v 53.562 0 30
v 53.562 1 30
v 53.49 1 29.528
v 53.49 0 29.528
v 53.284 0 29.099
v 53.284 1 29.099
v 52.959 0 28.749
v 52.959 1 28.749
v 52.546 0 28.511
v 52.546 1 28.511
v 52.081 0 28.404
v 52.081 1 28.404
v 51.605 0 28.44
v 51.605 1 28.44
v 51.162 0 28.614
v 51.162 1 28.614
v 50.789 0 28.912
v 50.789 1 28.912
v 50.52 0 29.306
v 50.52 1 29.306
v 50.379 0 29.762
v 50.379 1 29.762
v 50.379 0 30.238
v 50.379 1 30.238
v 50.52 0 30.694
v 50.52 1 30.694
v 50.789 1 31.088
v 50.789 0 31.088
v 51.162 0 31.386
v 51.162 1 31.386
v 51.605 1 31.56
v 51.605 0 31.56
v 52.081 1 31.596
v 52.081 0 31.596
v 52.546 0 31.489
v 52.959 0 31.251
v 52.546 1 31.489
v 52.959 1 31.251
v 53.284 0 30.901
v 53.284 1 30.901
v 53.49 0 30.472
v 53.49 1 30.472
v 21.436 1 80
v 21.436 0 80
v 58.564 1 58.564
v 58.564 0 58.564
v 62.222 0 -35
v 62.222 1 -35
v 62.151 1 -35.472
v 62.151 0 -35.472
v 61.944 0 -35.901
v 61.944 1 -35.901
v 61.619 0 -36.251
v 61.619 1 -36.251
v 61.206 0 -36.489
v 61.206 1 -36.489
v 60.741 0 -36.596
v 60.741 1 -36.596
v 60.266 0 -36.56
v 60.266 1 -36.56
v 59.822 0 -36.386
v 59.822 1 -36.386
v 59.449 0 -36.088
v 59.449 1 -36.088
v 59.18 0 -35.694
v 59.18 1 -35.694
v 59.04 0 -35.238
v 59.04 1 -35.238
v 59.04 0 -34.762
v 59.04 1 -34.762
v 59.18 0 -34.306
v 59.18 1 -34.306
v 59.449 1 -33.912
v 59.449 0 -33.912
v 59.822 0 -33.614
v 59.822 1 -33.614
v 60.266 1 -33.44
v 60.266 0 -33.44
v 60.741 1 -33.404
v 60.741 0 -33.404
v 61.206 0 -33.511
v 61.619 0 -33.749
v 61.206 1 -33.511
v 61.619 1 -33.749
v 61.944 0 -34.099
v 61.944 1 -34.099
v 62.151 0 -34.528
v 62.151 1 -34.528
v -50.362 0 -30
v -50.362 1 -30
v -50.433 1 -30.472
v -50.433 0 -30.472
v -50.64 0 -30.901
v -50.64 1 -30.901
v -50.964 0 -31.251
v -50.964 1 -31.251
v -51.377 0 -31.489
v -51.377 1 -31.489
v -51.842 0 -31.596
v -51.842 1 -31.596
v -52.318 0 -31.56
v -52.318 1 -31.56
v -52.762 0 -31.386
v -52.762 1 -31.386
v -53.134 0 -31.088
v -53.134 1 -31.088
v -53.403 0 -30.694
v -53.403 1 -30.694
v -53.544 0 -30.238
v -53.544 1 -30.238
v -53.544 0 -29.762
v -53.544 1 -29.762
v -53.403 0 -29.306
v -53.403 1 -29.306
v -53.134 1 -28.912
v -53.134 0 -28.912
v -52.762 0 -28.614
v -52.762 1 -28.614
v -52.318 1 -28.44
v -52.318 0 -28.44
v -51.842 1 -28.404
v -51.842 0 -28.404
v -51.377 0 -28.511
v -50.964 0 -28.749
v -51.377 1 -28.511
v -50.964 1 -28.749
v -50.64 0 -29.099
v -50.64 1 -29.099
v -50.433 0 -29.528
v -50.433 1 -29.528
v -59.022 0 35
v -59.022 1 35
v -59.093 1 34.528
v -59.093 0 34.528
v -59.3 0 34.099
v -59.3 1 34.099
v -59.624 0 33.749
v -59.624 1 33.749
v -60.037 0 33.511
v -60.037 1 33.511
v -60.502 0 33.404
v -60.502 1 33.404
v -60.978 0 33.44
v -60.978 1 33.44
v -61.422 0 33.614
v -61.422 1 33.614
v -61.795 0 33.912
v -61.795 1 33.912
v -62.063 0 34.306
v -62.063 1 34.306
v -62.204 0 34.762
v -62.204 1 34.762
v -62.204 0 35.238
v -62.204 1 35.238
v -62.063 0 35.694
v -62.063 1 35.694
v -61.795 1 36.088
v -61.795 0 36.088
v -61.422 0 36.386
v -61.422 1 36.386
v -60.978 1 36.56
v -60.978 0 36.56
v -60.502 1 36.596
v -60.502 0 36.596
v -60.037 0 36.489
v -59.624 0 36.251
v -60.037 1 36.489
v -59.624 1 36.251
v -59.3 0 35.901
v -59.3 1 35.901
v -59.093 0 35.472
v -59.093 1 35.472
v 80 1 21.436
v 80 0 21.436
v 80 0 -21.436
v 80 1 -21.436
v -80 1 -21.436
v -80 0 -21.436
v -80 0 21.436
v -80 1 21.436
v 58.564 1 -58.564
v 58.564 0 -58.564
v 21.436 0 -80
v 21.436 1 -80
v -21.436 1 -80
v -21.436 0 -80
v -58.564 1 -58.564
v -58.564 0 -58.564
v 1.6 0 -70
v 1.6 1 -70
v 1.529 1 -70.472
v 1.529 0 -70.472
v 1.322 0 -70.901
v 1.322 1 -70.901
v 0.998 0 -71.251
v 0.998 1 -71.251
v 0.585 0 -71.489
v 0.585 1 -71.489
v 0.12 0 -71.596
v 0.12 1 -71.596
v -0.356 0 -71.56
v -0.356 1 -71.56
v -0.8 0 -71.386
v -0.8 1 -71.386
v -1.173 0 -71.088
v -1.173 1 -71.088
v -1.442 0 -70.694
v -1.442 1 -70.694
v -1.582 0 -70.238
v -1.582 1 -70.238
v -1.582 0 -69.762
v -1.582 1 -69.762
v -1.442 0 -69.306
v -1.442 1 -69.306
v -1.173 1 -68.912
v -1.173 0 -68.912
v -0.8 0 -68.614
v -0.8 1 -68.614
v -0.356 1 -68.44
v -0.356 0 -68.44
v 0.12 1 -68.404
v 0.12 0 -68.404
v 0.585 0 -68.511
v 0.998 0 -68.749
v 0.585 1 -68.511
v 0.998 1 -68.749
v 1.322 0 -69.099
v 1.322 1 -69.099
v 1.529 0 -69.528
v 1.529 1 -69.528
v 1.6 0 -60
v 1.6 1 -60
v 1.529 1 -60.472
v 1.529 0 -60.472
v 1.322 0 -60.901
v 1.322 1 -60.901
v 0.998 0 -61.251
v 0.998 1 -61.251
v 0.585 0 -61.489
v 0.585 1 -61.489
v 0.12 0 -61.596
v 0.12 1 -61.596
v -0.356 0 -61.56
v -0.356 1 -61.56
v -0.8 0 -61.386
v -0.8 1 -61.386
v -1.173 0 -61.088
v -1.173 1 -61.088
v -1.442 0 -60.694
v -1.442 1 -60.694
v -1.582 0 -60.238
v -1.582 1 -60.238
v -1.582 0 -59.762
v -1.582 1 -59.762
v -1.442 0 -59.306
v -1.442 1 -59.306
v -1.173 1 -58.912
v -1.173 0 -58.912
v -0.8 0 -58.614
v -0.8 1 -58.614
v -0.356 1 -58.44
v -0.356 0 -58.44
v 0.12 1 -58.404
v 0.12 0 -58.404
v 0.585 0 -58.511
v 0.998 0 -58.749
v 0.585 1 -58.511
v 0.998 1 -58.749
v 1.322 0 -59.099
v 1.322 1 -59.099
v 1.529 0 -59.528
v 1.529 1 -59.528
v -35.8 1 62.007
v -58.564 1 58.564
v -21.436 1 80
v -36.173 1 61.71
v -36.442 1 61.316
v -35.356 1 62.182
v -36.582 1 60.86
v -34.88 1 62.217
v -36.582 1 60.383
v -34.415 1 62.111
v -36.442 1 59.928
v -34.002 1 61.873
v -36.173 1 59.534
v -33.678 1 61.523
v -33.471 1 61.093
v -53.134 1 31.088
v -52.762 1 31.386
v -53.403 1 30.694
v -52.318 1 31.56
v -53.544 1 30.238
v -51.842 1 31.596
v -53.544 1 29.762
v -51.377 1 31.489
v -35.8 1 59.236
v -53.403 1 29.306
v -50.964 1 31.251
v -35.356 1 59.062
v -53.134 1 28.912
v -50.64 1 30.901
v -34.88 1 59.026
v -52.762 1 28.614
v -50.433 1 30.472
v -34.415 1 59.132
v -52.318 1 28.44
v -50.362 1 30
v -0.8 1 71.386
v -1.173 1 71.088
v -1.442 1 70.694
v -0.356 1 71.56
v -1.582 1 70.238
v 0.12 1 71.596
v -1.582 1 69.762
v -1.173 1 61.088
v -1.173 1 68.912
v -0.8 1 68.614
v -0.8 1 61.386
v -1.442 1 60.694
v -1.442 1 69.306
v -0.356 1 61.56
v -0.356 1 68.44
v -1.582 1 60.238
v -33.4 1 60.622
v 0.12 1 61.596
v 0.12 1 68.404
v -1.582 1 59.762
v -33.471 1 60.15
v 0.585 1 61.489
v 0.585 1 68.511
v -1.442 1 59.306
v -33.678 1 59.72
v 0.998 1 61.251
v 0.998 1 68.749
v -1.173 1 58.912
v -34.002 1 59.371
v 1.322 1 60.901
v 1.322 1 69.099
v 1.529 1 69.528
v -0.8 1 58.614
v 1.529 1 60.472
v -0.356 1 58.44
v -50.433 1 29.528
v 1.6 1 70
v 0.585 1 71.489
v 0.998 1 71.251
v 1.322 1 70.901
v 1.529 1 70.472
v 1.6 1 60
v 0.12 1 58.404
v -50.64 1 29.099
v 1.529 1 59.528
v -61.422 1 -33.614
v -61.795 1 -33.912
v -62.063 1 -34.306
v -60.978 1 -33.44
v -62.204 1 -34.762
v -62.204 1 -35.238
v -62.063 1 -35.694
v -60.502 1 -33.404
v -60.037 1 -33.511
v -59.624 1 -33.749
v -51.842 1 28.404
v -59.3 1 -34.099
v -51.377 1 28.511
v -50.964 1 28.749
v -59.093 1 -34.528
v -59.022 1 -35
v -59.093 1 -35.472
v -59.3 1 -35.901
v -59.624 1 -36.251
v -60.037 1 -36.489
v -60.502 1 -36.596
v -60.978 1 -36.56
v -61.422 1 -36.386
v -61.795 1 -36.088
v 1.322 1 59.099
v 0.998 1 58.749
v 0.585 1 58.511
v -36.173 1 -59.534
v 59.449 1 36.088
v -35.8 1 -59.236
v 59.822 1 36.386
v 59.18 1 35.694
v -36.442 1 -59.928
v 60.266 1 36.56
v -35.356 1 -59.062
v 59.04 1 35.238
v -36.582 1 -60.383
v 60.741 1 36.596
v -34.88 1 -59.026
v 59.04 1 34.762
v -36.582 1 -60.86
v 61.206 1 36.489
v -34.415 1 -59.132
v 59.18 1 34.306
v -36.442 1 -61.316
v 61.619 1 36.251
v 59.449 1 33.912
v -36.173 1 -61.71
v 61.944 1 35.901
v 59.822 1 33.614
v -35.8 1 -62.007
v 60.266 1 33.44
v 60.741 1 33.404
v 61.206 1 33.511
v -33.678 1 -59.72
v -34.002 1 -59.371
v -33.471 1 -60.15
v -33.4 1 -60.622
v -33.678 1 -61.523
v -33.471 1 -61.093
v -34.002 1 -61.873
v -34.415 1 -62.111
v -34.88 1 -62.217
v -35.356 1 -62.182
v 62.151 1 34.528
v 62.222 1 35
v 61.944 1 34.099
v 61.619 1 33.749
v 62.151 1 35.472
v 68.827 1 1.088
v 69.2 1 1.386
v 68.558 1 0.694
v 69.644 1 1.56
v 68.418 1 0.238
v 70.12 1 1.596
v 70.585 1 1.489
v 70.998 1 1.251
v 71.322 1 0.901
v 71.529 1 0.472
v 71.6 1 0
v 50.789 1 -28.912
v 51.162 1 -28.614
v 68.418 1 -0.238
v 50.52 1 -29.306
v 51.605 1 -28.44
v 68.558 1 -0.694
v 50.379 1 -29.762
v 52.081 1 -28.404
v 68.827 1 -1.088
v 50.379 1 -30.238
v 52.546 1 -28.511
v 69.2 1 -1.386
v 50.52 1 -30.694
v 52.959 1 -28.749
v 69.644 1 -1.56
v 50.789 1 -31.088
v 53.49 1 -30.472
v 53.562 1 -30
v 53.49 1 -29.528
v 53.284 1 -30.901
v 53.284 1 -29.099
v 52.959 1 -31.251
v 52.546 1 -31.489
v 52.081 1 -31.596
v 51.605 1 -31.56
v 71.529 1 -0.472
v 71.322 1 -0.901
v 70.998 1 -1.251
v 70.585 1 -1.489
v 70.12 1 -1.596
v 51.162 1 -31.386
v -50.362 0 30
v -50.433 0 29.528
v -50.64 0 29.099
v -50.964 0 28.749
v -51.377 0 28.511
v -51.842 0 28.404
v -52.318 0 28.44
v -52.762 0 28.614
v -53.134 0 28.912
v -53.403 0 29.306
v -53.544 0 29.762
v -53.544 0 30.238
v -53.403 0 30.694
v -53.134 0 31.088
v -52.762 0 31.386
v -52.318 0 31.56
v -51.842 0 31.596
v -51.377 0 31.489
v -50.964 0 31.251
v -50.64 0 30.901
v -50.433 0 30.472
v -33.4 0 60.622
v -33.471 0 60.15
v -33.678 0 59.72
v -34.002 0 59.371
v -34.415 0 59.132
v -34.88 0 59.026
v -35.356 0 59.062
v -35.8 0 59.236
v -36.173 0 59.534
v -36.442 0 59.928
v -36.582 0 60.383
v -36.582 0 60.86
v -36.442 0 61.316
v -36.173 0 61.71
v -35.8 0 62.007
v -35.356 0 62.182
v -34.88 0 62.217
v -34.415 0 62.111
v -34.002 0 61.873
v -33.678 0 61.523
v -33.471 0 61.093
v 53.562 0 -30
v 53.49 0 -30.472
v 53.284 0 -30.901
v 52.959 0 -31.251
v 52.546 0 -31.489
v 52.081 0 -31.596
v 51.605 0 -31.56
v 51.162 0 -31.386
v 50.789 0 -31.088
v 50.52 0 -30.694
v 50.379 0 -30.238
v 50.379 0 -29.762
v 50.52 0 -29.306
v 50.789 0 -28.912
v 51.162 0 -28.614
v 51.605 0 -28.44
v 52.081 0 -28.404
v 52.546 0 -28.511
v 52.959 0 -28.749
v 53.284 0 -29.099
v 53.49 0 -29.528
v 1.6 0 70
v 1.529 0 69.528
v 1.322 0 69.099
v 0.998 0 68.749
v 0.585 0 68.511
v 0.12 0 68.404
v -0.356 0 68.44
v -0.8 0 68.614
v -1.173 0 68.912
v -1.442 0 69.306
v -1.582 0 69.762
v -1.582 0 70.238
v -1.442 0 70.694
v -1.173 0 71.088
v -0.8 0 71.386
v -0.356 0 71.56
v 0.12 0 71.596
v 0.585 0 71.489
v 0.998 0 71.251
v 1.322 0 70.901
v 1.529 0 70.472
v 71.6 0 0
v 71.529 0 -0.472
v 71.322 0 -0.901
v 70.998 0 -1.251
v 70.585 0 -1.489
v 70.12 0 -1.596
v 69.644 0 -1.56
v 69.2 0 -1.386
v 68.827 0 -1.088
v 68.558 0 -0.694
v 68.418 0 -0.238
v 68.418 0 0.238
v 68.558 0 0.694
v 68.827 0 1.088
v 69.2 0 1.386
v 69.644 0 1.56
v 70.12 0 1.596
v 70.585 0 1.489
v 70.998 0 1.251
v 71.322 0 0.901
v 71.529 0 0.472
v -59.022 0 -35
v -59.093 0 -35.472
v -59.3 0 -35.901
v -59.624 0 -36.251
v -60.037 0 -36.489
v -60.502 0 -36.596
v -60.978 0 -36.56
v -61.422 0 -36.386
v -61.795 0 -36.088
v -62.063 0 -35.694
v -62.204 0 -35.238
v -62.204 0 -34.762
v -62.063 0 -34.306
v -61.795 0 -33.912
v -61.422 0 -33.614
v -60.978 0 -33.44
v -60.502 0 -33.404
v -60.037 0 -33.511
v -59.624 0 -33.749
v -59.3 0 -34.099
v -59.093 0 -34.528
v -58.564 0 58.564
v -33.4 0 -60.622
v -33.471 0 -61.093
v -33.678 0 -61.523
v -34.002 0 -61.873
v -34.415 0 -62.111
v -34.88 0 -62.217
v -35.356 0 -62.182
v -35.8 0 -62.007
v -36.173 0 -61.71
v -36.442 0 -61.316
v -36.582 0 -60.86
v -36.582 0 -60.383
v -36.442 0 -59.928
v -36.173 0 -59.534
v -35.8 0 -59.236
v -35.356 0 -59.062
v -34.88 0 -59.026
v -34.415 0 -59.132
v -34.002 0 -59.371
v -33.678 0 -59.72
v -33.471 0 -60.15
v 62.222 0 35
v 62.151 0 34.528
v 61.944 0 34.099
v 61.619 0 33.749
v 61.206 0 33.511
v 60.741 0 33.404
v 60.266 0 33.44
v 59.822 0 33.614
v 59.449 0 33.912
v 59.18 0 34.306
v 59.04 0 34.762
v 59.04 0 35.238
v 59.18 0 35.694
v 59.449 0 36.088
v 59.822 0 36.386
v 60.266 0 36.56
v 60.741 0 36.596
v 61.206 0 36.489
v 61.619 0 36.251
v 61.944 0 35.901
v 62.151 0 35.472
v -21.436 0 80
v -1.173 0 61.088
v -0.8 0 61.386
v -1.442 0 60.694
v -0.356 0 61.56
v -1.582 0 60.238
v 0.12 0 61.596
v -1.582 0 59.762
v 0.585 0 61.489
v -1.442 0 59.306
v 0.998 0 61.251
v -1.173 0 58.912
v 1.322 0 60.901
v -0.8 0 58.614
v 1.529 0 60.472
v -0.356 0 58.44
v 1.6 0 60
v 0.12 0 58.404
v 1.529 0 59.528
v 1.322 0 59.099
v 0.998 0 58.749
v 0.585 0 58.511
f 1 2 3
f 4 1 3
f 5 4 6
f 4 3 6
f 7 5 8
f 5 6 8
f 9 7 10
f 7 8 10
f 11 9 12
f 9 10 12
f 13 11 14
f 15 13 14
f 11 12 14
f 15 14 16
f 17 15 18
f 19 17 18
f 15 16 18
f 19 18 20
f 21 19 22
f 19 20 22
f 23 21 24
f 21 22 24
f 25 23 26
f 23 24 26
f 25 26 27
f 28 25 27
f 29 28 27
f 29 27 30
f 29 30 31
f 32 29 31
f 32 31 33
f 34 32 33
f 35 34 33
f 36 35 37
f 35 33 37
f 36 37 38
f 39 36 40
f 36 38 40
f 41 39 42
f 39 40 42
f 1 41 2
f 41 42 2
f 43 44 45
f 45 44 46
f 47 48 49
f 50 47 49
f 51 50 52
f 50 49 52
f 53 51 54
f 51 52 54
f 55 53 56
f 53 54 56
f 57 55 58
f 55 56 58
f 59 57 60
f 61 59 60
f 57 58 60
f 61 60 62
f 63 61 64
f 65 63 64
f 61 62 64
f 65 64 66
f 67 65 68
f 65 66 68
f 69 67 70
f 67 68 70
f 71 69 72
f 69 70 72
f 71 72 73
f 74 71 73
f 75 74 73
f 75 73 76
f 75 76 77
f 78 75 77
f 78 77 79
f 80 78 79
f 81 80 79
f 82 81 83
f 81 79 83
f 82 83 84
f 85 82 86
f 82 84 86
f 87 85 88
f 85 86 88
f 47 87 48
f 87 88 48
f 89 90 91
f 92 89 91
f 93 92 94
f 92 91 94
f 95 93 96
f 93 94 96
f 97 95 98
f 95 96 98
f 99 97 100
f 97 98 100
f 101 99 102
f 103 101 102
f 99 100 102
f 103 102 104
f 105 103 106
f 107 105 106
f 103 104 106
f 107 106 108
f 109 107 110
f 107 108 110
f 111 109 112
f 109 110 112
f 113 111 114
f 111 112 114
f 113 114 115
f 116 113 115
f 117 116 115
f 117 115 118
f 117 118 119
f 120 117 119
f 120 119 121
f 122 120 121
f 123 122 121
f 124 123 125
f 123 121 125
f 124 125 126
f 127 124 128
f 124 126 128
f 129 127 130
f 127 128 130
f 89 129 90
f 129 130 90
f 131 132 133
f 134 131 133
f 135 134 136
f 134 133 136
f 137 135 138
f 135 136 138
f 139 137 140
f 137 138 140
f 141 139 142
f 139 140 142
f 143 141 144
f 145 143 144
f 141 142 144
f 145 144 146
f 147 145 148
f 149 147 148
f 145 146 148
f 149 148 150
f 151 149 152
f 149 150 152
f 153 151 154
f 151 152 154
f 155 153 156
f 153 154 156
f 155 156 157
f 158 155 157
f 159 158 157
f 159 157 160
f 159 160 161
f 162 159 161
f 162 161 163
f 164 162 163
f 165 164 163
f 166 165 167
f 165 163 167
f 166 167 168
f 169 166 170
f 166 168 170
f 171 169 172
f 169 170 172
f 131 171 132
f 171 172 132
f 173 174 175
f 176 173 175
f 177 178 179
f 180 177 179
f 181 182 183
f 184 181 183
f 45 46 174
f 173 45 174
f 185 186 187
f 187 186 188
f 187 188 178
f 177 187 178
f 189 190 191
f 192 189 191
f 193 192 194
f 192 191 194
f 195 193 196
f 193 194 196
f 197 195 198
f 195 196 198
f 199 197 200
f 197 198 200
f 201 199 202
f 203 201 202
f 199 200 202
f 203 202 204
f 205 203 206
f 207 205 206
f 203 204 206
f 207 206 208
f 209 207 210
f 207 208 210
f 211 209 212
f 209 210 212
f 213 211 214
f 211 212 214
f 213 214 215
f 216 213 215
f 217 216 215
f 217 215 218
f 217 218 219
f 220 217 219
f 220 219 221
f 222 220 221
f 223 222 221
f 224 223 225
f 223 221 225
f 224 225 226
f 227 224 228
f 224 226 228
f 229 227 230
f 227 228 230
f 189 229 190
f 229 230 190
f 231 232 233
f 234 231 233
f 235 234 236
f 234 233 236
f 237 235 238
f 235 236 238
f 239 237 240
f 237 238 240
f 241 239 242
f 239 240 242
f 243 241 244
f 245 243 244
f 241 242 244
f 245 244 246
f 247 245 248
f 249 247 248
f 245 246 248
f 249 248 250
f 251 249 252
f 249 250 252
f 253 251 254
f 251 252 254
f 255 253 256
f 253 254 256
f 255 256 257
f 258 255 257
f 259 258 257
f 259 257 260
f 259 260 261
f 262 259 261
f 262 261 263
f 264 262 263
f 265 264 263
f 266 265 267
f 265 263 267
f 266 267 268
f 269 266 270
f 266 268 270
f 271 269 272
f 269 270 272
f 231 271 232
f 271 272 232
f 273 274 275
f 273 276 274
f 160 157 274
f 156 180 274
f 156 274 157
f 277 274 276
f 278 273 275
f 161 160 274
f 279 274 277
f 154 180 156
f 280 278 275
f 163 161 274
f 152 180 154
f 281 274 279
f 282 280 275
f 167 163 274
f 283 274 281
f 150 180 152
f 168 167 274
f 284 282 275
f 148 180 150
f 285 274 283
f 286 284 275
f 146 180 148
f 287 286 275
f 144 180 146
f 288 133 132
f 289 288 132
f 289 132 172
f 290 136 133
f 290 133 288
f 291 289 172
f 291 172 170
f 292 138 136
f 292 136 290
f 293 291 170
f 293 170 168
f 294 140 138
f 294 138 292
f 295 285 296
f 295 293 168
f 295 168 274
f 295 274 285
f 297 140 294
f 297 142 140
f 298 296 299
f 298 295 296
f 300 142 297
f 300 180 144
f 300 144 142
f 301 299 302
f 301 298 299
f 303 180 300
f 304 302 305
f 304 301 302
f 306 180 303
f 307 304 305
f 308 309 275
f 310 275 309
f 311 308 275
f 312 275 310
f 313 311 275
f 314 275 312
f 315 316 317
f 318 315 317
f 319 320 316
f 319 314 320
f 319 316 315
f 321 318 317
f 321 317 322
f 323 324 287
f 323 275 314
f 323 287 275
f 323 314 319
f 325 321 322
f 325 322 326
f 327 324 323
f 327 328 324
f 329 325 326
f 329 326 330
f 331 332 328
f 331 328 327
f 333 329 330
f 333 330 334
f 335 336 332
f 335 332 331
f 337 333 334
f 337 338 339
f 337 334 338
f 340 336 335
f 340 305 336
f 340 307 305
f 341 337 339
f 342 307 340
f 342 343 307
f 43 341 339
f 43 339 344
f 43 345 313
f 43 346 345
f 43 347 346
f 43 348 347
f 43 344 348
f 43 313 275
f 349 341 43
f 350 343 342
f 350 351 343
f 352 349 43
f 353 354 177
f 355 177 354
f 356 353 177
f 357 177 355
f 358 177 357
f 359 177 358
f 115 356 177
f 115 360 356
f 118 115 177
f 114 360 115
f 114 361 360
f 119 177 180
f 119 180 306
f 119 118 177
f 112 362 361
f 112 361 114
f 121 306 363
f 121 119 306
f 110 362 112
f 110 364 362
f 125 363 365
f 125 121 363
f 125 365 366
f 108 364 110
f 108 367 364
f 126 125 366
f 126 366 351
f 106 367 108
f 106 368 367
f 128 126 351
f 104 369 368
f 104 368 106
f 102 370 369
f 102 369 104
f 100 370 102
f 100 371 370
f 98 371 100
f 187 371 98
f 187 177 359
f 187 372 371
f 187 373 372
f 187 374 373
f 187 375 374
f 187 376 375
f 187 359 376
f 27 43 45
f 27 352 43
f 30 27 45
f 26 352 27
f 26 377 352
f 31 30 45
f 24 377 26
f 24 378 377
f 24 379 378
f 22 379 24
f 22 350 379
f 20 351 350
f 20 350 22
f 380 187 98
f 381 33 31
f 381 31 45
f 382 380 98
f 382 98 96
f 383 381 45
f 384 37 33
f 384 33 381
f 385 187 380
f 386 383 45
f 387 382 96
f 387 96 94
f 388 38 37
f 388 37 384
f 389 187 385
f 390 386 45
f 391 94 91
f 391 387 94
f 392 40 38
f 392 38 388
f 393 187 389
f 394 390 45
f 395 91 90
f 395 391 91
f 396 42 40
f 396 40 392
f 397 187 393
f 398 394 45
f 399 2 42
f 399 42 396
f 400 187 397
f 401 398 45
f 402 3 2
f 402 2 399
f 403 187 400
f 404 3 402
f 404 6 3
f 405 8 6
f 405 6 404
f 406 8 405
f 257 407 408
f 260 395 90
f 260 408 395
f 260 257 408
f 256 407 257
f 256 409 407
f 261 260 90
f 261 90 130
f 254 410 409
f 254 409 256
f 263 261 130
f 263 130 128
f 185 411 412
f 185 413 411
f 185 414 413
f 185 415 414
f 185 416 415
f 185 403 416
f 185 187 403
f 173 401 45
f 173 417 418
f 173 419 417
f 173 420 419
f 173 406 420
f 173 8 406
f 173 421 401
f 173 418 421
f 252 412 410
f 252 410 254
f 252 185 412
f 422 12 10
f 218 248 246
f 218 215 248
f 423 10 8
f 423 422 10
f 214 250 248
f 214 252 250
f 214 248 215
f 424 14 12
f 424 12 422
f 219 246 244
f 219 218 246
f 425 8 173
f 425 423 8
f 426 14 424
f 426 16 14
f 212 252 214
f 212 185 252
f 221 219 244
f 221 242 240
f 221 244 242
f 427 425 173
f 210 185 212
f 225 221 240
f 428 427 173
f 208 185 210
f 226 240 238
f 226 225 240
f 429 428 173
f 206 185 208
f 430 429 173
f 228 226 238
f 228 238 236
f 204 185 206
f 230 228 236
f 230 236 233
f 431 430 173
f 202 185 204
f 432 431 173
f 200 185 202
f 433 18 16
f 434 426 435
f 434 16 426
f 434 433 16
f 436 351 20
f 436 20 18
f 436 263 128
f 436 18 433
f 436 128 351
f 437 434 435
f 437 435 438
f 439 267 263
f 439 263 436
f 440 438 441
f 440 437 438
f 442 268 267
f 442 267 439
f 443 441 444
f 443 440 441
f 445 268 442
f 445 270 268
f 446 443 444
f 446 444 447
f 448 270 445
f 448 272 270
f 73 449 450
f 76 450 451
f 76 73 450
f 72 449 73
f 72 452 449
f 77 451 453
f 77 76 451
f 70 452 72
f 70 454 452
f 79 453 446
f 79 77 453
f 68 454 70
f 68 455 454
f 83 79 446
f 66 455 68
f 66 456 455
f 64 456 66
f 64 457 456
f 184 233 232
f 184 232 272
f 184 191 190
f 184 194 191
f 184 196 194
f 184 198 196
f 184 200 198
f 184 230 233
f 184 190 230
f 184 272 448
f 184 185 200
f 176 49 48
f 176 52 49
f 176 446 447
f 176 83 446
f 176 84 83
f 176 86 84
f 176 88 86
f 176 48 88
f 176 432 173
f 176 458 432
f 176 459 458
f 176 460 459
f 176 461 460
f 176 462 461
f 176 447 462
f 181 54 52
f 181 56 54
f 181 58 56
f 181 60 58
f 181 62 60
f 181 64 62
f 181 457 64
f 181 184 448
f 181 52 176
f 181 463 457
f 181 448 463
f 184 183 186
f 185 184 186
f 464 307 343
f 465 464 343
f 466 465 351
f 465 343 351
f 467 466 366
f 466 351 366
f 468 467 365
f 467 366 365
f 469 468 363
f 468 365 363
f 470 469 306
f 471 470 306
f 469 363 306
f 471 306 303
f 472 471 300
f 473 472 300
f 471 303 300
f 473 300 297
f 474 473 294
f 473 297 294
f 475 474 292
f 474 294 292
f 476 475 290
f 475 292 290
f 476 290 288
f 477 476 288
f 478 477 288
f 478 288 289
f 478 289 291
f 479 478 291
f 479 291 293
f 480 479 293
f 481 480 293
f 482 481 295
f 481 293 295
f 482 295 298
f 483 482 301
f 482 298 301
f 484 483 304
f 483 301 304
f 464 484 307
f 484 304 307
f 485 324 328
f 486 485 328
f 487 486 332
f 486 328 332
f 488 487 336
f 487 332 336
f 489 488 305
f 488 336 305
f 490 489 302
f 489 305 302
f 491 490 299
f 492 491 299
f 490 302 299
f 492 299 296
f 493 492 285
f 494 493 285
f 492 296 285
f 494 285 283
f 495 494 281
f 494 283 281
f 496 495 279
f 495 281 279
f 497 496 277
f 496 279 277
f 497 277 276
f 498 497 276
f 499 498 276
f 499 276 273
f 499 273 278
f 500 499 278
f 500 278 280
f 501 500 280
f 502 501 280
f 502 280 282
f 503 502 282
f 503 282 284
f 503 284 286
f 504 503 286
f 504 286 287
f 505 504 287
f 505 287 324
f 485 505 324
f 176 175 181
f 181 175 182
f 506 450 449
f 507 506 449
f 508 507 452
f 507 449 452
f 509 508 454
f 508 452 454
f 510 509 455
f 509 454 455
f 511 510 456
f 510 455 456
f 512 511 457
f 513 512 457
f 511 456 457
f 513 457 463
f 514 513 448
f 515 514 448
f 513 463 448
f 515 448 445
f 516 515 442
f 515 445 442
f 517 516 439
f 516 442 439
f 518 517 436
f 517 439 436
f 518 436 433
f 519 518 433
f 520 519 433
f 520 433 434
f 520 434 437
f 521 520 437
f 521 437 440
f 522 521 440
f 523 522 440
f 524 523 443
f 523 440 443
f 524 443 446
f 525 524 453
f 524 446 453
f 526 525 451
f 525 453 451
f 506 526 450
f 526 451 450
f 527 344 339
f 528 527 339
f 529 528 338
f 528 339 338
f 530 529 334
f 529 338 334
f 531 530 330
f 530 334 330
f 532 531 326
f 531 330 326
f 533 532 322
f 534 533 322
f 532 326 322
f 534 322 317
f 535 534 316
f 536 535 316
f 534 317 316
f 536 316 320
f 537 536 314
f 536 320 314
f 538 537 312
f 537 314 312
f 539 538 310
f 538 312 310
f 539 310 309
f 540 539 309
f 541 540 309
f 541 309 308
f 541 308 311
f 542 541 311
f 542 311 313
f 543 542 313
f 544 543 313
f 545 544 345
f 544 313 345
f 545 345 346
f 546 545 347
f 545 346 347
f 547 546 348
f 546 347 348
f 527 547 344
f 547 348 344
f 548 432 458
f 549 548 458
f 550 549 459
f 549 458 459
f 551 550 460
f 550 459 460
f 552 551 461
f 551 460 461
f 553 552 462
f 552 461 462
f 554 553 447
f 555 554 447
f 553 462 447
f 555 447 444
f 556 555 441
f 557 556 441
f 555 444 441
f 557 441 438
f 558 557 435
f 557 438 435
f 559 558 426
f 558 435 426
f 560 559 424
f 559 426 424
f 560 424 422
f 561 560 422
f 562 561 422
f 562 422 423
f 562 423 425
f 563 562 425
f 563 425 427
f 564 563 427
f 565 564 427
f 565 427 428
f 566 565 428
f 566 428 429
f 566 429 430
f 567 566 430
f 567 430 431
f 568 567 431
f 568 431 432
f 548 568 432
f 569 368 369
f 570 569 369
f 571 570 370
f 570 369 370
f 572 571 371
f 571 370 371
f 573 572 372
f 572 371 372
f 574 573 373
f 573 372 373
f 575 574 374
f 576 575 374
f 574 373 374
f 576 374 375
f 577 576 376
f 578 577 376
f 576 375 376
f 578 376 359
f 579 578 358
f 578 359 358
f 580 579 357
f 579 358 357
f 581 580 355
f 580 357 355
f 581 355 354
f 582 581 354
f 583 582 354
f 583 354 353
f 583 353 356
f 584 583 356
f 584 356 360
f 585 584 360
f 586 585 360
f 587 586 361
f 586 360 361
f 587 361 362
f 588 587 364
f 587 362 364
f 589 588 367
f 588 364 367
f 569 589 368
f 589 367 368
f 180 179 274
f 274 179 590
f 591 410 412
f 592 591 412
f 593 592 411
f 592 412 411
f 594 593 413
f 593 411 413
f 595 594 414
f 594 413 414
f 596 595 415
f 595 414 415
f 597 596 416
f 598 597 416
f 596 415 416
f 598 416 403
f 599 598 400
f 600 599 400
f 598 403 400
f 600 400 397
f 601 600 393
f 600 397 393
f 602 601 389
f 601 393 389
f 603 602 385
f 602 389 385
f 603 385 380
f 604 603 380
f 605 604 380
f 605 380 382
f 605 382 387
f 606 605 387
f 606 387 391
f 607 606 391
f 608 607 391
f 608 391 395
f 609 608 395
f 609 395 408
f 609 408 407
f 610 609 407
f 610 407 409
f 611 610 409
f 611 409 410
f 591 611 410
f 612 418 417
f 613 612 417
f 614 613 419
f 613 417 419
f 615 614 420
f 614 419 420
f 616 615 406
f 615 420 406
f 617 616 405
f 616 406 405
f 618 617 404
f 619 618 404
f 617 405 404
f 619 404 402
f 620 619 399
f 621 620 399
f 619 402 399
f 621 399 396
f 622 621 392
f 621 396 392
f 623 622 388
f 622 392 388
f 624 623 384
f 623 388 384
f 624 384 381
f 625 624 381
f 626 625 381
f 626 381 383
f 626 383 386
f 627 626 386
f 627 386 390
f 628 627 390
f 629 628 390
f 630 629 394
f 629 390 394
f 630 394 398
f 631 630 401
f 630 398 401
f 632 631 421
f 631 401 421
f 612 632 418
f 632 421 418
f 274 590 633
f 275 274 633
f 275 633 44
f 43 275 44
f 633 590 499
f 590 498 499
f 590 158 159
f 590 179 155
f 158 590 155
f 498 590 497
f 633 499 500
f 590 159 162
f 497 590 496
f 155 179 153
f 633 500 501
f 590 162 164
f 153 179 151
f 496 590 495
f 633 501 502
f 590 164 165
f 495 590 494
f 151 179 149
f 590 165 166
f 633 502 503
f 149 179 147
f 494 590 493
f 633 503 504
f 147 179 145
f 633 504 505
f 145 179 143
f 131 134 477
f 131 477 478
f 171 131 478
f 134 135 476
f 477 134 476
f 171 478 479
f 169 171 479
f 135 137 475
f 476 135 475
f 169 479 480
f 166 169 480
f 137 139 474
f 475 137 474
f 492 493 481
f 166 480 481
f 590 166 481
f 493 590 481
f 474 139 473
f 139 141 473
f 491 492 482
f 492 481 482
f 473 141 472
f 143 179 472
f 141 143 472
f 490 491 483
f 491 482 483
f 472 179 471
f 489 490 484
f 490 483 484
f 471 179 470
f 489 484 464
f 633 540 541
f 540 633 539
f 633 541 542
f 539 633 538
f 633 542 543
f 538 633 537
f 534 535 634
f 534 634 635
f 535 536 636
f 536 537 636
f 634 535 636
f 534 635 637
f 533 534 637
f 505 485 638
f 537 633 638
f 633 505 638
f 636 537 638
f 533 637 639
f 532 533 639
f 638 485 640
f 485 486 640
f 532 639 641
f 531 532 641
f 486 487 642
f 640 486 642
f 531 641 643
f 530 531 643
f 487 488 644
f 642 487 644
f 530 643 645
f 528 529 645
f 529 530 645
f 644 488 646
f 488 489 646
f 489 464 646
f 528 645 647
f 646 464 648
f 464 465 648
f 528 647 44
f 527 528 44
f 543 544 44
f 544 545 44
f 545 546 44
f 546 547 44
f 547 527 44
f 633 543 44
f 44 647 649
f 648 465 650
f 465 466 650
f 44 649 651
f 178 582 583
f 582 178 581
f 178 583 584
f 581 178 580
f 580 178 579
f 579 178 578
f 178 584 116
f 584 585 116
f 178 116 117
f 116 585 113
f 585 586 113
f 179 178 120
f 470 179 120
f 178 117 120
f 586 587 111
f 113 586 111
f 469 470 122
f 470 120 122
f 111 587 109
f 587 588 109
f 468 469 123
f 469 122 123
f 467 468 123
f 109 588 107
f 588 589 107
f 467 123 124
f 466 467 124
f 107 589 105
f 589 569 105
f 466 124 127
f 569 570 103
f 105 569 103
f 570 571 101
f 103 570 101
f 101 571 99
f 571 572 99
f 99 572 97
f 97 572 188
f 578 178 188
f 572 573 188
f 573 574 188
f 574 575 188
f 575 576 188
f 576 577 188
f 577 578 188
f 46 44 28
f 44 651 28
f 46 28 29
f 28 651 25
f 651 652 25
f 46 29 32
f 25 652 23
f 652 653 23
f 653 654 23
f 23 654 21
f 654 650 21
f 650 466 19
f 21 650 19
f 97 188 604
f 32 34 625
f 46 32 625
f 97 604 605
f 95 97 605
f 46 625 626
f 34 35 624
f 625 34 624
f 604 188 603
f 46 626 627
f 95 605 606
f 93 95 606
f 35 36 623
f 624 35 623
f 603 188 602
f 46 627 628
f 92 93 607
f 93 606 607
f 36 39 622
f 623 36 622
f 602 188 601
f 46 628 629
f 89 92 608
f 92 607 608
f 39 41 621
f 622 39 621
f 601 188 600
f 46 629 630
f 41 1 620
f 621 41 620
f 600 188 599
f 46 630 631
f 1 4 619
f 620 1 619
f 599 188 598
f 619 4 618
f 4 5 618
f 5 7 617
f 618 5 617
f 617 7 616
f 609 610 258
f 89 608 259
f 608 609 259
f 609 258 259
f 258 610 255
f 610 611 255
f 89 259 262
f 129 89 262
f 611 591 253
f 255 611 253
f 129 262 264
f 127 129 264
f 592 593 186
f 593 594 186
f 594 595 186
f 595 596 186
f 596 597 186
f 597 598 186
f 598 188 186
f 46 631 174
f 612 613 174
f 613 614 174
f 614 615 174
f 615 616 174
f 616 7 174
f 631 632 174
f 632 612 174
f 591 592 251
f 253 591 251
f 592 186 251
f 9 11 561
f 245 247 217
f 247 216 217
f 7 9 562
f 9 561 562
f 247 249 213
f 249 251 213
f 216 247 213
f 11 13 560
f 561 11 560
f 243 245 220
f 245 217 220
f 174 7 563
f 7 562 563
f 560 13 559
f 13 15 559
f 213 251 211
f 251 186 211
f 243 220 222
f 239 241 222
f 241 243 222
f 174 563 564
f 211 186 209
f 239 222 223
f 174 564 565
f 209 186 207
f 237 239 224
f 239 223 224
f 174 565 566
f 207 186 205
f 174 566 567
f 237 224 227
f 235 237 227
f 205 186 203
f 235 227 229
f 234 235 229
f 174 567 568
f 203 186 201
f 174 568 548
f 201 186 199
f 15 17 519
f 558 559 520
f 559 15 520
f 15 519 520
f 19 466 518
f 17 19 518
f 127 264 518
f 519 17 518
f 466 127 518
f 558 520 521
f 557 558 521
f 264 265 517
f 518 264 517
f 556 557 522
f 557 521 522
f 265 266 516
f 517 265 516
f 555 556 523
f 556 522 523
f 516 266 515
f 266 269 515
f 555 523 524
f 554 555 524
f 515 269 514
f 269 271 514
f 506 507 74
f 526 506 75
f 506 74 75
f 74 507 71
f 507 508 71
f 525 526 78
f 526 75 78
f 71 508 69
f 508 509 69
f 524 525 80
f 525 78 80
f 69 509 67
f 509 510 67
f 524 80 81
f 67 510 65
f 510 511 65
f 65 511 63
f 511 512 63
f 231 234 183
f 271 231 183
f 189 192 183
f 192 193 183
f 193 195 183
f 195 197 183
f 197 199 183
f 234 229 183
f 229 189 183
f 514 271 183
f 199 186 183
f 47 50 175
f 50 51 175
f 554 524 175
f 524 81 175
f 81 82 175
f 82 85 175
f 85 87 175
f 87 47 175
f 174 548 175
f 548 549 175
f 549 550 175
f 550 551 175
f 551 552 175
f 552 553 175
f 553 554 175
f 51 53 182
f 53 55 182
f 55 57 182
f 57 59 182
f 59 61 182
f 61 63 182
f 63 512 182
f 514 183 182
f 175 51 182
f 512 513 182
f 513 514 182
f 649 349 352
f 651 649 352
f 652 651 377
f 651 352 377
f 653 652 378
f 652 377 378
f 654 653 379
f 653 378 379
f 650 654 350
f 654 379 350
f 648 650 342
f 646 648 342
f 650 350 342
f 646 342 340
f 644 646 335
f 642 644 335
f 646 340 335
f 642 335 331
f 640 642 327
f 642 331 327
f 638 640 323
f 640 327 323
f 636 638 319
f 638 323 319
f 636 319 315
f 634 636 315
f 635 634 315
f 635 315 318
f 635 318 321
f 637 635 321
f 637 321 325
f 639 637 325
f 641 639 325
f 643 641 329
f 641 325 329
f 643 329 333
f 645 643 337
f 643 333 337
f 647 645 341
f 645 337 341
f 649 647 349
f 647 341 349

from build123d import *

# Parameters (mm, degrees)
EXTRUDE_2_DEPTH      = 1
SKETCH_9_R           = 1.6
CUT_EXTRUDE_5_DEPTH  = 1
SKETCH_10_R          = 1.6
CUT_EXTRUDE_6_DEPTH  = 1
SKETCH_11_R          = 1.6
CUT_EXTRUDE_7_DEPTH  = 1
SKETCH_12_R          = 1.6
CUT_EXTRUDE_8_DEPTH  = 1
SKETCH_16_R          = 1.6
CUT_EXTRUDE_9_DEPTH  = 1
SKETCH_17_R          = 1.6
CUT_EXTRUDE_10_DEPTH = 1
SKETCH_18_R          = 1.6
CUT_EXTRUDE_11_DEPTH = 1
SKETCH_19_R          = 1.6
CUT_EXTRUDE_12_DEPTH = 1
SKETCH_20_R          = 1.6
CUT_EXTRUDE_13_DEPTH = 1
SKETCH_21_R          = 1.6
CUT_EXTRUDE_14_DEPTH = 1
SKETCH_22_R          = 1.6
CUT_EXTRUDE_15_DEPTH = 1
SKETCH_23_R          = 1.6
CUT_EXTRUDE_16_DEPTH = 1
CUT_EXTRUDE_17_REACH = 3
SKETCH_24_R          = 1.6
CUT_EXTRUDE_18_REACH = 3
SKETCH_25_R          = 1.6
CUT_EXTRUDE_19_REACH = 3
SKETCH_26_R          = 1.6


with BuildPart() as part:
    # ｽｹｯﾁ8 → ﾎﾞｽ - 押し出し2 (new body)
    with BuildSketch(Plane(origin=(0, 0, 0), x_dir=(1, 0, 0), z_dir=(0, 1, 0))):
        Polygon((-80, -21.435935394), (-58.564064606, -58.564064606), (-21.435935394, -80), (21.435935394, -80), (58.564064606, -58.564064606), (80, -21.435935394), (80, 21.435935394), (58.564064606, 58.564064606), (21.435935394, 80), (-21.435935394, 80), (-58.564064606, 58.564064606), (-80, 21.435935394), align=None)
    extrude(amount=EXTRUDE_2_DEPTH)

    # ｽｹｯﾁ9 → ｶｯﾄ - 押し出し5 (cut)
    with BuildSketch(Plane(origin=(0, 1, 0), x_dir=(1, 0, 0), z_dir=(0, 1, 0))):
        with Locations((-60.621778265, 35)):
            Circle(SKETCH_9_R)
    extrude(amount=-CUT_EXTRUDE_5_DEPTH, mode=Mode.SUBTRACT)

    # ｽｹｯﾁ10 → ｶｯﾄ - 押し出し6 (cut)
    with BuildSketch(Plane(origin=(0, 1, 0), x_dir=(1, 0, 0), z_dir=(0, 1, 0))):
        with Locations((-51.961524227, 30)):
            Circle(SKETCH_10_R)
    extrude(amount=-CUT_EXTRUDE_6_DEPTH, mode=Mode.SUBTRACT)

    # ｽｹｯﾁ11 → ｶｯﾄ - 押し出し7 (cut)
    with BuildSketch(Plane(origin=(0, 1, 0), x_dir=(1, 0, 0), z_dir=(0, 1, 0))):
        with Locations((60.621778265, -35)):
            Circle(SKETCH_11_R)
    extrude(amount=-CUT_EXTRUDE_7_DEPTH, mode=Mode.SUBTRACT)

    # ｽｹｯﾁ12 → ｶｯﾄ - 押し出し8 (cut)
    with BuildSketch(Plane(origin=(0, 1, 0), x_dir=(1, 0, 0), z_dir=(0, 1, 0))):
        with Locations((51.961524227, -30)):
            Circle(SKETCH_12_R)
    extrude(amount=-CUT_EXTRUDE_8_DEPTH, mode=Mode.SUBTRACT)

    # ｽｹｯﾁ16 → ｶｯﾄ - 押し出し9 (cut)
    with BuildSketch(Plane(origin=(0, 1, 0), x_dir=(1, 0, 0), z_dir=(0, 1, 0))):
        with Locations((60.621778265, 35)):
            Circle(SKETCH_16_R)
    extrude(amount=-CUT_EXTRUDE_9_DEPTH, mode=Mode.SUBTRACT)

    # ｽｹｯﾁ17 → ｶｯﾄ - 押し出し10 (cut)
    with BuildSketch(Plane(origin=(0, 1, 0), x_dir=(1, 0, 0), z_dir=(0, 1, 0))):
        with Locations((51.961524227, 30)):
            Circle(SKETCH_17_R)
    extrude(amount=-CUT_EXTRUDE_10_DEPTH, mode=Mode.SUBTRACT)

    # ｽｹｯﾁ18 → ｶｯﾄ - 押し出し11 (cut)
    with BuildSketch(Plane(origin=(0, 1, 0), x_dir=(1, 0, 0), z_dir=(0, 1, 0))):
        with Locations((-60.621778265, -35)):
            Circle(SKETCH_18_R)
    extrude(amount=-CUT_EXTRUDE_11_DEPTH, mode=Mode.SUBTRACT)

    # ｽｹｯﾁ19 → ｶｯﾄ - 押し出し12 (cut)
    with BuildSketch(Plane(origin=(0, 1, 0), x_dir=(1, 0, 0), z_dir=(0, 1, 0))):
        with Locations((-51.961524227, -30)):
            Circle(SKETCH_19_R)
    extrude(amount=-CUT_EXTRUDE_12_DEPTH, mode=Mode.SUBTRACT)

    # ｽｹｯﾁ20 → ｶｯﾄ - 押し出し13 (cut)
    with BuildSketch(Plane(origin=(0, 1, 0), x_dir=(1, 0, 0), z_dir=(0, 1, 0))):
        with Locations((0, 70)):
            Circle(SKETCH_20_R)
    extrude(amount=-CUT_EXTRUDE_13_DEPTH, mode=Mode.SUBTRACT)

    # ｽｹｯﾁ21 → ｶｯﾄ - 押し出し14 (cut)
    with BuildSketch(Plane(origin=(0, 1, 0), x_dir=(1, 0, 0), z_dir=(0, 1, 0))):
        with Locations((0, 60)):
            Circle(SKETCH_21_R)
    extrude(amount=-CUT_EXTRUDE_14_DEPTH, mode=Mode.SUBTRACT)

    # ｽｹｯﾁ22 → ｶｯﾄ - 押し出し15 (cut)
    with BuildSketch(Plane(origin=(0, 1, 0), x_dir=(1, 0, 0), z_dir=(0, 1, 0))):
        with Locations((0, -70)):
            Circle(SKETCH_22_R)
    extrude(amount=-CUT_EXTRUDE_15_DEPTH, mode=Mode.SUBTRACT)

    # ｽｹｯﾁ23 → ｶｯﾄ - 押し出し16 (cut)
    with BuildSketch(Plane(origin=(0, 1, 0), x_dir=(1, 0, 0), z_dir=(0, 1, 0))):
        with Locations((0, -60)):
            Circle(SKETCH_23_R)
    extrude(amount=-CUT_EXTRUDE_16_DEPTH, mode=Mode.SUBTRACT)

    # ｽｹｯﾁ24 → ｶｯﾄ - 押し出し17 (cut, up to next)
    with BuildSketch(Plane(origin=(0, 1, 0), x_dir=(1, 0, 0), z_dir=(0, 1, 0)), mode=Mode.PRIVATE) as cut_extrude_17_sk1:
        with Locations((-35, 60.621778265)):
            Circle(SKETCH_24_R)
    cut_extrude_17_tool1 = extrude(cut_extrude_17_sk1.sketch, amount=-CUT_EXTRUDE_17_REACH, mode=Mode.PRIVATE) & part.part
    add(cut_extrude_17_tool1.solids().sort_by_distance((-35, 1, -60.621778))[0], mode=Mode.SUBTRACT)

    # ｽｹｯﾁ25 → ｶｯﾄ - 押し出し18 (cut, up to next)
    with BuildSketch(Plane(origin=(0, 1, 0), x_dir=(1, 0, 0), z_dir=(0, 1, 0)), mode=Mode.PRIVATE) as cut_extrude_18_sk1:
        with Locations((-35, -60.621778265)):
            Circle(SKETCH_25_R)
    cut_extrude_18_tool1 = extrude(cut_extrude_18_sk1.sketch, amount=-CUT_EXTRUDE_18_REACH, mode=Mode.PRIVATE) & part.part
    add(cut_extrude_18_tool1.solids().sort_by_distance((-35, 1, 60.621778))[0], mode=Mode.SUBTRACT)

    # ｽｹｯﾁ26 → ｶｯﾄ - 押し出し19 (cut, up to next)
    with BuildSketch(Plane(origin=(0, 1, 0), x_dir=(1, 0, 0), z_dir=(0, 1, 0)), mode=Mode.PRIVATE) as cut_extrude_19_sk1:
        with Locations((70, 0)):
            Circle(SKETCH_26_R)
    cut_extrude_19_tool1 = extrude(cut_extrude_19_sk1.sketch, amount=-CUT_EXTRUDE_19_REACH, mode=Mode.PRIVATE) & part.part
    add(cut_extrude_19_tool1.solids().sort_by_distance((70, 1, 0))[0], mode=Mode.SUBTRACT)


solid = part.part
